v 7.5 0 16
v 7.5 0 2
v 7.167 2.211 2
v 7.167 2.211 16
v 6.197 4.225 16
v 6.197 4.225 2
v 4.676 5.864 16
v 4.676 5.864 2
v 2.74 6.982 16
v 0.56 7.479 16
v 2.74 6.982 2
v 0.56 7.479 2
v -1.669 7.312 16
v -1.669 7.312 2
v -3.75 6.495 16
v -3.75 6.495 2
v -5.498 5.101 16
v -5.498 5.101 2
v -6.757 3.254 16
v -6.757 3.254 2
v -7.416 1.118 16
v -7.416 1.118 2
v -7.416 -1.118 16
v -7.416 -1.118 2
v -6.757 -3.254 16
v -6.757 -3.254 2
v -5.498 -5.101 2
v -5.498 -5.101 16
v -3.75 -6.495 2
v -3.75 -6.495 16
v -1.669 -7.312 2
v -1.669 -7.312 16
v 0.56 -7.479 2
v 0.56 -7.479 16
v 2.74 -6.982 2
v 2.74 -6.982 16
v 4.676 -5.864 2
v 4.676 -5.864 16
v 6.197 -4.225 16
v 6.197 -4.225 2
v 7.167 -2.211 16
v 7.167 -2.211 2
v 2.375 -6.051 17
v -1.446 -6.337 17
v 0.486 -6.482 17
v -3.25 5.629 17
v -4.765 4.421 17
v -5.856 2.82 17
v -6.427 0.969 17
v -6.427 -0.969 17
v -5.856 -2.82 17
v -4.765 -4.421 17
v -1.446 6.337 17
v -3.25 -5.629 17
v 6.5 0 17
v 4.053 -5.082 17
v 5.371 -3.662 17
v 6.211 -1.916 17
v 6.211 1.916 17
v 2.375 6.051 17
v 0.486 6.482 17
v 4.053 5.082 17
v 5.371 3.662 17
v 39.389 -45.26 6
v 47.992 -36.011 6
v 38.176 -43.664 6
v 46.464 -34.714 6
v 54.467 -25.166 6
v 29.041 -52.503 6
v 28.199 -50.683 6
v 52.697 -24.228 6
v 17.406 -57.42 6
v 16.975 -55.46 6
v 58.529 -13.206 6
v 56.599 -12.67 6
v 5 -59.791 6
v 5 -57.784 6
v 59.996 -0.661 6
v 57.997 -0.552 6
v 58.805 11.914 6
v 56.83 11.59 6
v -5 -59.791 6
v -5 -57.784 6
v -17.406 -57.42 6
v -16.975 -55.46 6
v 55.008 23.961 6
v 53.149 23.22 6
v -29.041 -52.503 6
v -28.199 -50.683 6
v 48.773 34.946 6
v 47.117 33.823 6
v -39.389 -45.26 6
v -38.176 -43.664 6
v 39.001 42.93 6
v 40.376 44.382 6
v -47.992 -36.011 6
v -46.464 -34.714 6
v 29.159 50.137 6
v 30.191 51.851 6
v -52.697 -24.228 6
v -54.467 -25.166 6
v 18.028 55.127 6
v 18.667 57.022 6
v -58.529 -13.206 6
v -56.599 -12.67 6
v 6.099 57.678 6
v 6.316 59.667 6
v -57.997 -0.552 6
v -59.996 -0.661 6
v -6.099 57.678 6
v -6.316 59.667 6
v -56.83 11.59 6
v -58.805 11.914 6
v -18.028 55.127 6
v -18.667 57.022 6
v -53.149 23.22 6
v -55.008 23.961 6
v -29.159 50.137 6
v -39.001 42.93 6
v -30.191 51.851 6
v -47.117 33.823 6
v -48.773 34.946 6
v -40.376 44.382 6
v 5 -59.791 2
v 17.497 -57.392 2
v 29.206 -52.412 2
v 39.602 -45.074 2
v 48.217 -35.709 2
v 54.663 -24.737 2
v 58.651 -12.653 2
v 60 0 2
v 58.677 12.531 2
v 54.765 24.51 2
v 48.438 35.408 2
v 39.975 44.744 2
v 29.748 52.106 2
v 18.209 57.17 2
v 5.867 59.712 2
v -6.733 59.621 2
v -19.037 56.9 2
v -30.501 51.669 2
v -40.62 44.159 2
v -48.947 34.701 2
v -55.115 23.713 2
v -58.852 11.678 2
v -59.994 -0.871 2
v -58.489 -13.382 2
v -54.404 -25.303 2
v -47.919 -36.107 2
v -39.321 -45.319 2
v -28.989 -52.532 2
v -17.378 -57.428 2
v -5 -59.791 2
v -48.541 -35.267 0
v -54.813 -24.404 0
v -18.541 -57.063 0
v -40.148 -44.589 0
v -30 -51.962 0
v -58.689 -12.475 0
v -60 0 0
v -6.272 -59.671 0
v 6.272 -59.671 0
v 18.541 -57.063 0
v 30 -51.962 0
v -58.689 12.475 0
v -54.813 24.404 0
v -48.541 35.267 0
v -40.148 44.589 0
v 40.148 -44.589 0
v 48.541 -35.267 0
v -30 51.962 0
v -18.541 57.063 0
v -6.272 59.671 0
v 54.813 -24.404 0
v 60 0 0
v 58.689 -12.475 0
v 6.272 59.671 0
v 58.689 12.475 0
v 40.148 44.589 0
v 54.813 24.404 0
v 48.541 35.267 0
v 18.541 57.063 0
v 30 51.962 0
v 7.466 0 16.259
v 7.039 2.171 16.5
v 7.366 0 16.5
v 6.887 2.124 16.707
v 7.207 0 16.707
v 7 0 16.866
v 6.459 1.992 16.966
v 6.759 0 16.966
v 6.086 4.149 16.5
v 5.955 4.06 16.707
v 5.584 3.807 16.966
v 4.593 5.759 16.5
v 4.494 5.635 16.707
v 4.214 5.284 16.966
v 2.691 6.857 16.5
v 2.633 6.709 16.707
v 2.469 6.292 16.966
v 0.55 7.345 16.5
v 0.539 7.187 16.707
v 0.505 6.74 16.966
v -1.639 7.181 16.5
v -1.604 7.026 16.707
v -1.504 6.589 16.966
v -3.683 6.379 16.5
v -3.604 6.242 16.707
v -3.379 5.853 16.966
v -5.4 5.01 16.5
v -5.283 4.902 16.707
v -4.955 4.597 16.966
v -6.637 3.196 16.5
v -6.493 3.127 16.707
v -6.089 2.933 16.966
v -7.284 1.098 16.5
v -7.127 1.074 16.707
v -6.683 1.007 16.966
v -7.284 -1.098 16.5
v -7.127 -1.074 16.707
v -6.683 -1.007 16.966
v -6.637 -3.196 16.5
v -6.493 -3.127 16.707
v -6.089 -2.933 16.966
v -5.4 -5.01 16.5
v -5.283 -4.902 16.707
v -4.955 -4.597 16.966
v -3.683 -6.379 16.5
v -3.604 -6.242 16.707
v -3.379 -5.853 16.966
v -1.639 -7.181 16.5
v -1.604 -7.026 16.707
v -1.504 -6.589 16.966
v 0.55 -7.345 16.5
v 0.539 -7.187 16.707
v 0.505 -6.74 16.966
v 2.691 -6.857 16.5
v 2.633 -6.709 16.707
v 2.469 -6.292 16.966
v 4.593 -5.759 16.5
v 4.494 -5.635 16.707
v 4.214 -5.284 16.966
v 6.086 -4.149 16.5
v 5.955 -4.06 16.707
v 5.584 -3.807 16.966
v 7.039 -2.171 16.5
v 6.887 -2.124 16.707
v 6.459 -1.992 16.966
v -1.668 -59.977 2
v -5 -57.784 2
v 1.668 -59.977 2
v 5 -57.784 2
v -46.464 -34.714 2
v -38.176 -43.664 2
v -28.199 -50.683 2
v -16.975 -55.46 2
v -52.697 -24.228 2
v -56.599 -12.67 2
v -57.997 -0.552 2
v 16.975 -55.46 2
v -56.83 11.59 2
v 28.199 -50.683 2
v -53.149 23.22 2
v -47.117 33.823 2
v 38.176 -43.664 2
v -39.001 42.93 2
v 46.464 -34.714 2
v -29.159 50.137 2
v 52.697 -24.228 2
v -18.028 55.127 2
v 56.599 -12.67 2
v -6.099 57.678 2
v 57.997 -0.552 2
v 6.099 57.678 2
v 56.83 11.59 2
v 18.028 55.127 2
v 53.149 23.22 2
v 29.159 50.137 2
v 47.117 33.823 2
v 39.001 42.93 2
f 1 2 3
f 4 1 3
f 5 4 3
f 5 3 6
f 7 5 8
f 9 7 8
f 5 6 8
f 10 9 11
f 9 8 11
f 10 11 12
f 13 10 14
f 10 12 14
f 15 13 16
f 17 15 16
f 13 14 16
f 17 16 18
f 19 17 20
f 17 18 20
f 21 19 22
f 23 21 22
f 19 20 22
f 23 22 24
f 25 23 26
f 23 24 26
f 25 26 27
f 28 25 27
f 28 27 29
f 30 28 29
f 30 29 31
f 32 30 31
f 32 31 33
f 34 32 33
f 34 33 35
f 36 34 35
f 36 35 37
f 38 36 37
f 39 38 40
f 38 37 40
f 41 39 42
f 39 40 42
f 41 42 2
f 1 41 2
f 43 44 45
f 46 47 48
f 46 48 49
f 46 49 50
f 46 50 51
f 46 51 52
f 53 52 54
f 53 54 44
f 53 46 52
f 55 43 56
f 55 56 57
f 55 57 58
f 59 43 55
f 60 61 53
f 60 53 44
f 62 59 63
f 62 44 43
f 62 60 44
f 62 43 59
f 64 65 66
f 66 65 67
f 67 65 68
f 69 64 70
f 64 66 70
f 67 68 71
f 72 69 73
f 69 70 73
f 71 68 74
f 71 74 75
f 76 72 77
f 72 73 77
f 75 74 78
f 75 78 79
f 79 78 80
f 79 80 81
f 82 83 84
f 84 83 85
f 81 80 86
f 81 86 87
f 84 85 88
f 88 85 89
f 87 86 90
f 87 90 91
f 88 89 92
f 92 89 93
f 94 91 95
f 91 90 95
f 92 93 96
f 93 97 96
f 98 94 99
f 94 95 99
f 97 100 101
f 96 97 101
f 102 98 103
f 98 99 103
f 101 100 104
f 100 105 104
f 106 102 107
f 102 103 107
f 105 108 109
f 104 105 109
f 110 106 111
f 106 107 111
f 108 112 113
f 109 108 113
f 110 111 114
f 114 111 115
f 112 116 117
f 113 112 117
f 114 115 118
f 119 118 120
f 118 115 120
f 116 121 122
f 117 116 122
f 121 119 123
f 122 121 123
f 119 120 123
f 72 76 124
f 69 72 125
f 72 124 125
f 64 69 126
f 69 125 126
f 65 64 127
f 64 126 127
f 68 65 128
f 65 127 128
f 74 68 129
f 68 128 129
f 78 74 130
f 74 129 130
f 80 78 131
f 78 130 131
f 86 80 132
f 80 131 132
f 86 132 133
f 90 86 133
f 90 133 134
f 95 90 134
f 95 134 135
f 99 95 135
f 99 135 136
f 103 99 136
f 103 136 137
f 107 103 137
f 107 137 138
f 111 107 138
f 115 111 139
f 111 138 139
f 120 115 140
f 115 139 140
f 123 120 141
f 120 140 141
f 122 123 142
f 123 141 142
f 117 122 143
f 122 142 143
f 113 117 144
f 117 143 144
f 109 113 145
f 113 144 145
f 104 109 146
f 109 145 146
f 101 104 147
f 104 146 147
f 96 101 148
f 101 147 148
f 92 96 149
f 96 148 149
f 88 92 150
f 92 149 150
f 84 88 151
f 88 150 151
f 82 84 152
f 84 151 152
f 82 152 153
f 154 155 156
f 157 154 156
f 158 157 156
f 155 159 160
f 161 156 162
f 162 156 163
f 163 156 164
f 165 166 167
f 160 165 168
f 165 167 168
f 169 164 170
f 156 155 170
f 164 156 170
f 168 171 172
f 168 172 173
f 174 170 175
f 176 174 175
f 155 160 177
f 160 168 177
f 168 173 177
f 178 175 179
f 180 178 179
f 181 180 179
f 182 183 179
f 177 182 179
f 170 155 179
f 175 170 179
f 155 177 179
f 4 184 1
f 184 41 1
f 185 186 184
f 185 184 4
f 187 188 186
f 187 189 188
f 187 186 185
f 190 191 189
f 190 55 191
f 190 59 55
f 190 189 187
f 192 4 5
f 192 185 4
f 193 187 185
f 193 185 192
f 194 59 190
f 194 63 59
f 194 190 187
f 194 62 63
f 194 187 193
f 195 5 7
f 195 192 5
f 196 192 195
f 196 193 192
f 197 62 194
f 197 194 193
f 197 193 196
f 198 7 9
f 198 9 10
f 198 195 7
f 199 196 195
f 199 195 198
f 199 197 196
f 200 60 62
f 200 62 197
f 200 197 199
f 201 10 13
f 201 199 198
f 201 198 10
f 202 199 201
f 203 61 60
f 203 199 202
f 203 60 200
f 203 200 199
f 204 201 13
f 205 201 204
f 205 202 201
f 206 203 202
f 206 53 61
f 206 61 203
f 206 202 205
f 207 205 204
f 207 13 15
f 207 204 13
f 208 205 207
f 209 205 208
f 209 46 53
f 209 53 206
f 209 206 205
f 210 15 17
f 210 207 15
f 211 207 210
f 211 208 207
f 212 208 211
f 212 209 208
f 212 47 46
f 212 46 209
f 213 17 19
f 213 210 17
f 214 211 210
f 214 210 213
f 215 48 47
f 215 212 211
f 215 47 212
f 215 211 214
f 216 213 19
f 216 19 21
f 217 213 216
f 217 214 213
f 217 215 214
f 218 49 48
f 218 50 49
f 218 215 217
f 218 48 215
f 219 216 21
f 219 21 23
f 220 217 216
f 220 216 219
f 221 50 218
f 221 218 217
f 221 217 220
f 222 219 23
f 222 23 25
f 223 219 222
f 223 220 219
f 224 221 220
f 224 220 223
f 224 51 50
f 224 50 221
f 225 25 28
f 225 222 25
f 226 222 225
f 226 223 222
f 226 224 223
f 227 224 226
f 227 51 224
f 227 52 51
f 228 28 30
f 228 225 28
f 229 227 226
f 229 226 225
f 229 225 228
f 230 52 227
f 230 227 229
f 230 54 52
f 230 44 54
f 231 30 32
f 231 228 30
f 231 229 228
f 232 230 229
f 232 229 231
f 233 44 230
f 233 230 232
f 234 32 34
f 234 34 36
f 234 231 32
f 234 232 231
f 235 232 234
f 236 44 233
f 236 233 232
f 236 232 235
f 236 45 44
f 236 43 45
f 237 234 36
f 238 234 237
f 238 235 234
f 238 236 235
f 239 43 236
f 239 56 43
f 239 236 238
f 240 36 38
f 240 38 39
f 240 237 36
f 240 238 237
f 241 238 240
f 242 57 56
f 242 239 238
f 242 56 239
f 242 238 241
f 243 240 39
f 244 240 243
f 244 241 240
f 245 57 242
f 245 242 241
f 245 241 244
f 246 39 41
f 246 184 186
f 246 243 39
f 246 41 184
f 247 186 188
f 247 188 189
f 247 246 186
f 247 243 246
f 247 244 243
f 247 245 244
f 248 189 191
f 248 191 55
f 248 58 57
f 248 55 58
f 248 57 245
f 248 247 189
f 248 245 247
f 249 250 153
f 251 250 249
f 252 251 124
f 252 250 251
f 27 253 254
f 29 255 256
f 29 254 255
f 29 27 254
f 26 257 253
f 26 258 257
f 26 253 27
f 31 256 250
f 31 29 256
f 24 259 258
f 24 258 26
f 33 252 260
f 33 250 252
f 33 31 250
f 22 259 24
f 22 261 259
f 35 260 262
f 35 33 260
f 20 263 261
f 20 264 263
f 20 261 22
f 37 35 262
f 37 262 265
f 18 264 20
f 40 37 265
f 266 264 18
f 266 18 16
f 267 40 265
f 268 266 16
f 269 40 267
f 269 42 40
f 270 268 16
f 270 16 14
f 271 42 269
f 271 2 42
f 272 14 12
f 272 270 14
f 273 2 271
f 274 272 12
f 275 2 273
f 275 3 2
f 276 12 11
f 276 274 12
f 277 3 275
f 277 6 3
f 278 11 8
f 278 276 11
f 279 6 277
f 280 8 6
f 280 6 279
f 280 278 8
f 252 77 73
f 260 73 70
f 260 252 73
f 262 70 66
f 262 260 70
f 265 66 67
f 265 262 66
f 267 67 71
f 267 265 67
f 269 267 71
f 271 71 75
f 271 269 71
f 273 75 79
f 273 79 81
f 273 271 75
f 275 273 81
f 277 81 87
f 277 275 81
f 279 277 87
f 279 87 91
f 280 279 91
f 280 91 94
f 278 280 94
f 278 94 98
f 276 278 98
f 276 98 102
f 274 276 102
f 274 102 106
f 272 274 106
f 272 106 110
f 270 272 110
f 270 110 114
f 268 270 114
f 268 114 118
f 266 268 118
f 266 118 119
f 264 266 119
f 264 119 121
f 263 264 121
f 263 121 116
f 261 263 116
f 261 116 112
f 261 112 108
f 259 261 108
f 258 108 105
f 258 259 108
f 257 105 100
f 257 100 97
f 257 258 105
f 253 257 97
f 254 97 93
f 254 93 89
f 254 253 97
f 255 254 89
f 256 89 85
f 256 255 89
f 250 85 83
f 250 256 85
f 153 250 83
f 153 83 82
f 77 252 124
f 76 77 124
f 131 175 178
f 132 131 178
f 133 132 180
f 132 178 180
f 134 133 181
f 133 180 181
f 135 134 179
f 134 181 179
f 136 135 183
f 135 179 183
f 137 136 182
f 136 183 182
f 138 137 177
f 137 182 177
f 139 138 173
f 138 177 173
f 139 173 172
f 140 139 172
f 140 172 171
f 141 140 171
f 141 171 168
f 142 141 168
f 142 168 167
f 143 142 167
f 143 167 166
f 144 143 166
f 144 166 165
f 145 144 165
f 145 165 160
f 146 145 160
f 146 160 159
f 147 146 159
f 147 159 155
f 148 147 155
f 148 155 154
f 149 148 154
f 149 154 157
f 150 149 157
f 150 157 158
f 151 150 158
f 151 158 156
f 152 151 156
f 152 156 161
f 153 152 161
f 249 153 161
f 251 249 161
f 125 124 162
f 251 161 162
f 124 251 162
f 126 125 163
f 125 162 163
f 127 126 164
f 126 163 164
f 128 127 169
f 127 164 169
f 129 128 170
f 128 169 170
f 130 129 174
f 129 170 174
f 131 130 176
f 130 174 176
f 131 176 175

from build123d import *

# Parameters (mm, degrees)
SKETCH_R     = 60
PAD_DEPTH    = 2
PAD001_DEPTH = 5
SKETCH002_R  = 7.5
PAD002_DEPTH = 15
FILLET_R     = 1


with BuildPart() as part:
    # Sketch → Pad (new body)
    with BuildSketch(Plane.XY):
        Circle(SKETCH_R)
    extrude(amount=PAD_DEPTH)

    # Sketch001 → Pad001 (join)
    with BuildSketch(Plane.XY.offset(1)):
        with BuildLine():
            ThreePointArc((5, -57.784081), (0, 58), (-5, -57.784081))
            Line((-5, -57.784081), (-5, -59.791304))
            ThreePointArc((5, -59.791304), (0, 60), (-5, -59.791304))
            Line((5, -57.784081), (5, -59.791304))
        make_face()
    extrude(amount=PAD001_DEPTH)

    # Sketch002 (on Face4 of Pad001) → Pad002 (join)
    with BuildSketch(Plane.XY.offset(2)):
        Circle(SKETCH002_R)
    extrude(amount=PAD002_DEPTH)

    # Fillet
    fillet_edges = [part.edges().sort_by_distance(p)[0] for p in [
        (-7.5, 0, 17),
    ]]
    fillet(fillet_edges, radius=FILLET_R)


solid = part.part
